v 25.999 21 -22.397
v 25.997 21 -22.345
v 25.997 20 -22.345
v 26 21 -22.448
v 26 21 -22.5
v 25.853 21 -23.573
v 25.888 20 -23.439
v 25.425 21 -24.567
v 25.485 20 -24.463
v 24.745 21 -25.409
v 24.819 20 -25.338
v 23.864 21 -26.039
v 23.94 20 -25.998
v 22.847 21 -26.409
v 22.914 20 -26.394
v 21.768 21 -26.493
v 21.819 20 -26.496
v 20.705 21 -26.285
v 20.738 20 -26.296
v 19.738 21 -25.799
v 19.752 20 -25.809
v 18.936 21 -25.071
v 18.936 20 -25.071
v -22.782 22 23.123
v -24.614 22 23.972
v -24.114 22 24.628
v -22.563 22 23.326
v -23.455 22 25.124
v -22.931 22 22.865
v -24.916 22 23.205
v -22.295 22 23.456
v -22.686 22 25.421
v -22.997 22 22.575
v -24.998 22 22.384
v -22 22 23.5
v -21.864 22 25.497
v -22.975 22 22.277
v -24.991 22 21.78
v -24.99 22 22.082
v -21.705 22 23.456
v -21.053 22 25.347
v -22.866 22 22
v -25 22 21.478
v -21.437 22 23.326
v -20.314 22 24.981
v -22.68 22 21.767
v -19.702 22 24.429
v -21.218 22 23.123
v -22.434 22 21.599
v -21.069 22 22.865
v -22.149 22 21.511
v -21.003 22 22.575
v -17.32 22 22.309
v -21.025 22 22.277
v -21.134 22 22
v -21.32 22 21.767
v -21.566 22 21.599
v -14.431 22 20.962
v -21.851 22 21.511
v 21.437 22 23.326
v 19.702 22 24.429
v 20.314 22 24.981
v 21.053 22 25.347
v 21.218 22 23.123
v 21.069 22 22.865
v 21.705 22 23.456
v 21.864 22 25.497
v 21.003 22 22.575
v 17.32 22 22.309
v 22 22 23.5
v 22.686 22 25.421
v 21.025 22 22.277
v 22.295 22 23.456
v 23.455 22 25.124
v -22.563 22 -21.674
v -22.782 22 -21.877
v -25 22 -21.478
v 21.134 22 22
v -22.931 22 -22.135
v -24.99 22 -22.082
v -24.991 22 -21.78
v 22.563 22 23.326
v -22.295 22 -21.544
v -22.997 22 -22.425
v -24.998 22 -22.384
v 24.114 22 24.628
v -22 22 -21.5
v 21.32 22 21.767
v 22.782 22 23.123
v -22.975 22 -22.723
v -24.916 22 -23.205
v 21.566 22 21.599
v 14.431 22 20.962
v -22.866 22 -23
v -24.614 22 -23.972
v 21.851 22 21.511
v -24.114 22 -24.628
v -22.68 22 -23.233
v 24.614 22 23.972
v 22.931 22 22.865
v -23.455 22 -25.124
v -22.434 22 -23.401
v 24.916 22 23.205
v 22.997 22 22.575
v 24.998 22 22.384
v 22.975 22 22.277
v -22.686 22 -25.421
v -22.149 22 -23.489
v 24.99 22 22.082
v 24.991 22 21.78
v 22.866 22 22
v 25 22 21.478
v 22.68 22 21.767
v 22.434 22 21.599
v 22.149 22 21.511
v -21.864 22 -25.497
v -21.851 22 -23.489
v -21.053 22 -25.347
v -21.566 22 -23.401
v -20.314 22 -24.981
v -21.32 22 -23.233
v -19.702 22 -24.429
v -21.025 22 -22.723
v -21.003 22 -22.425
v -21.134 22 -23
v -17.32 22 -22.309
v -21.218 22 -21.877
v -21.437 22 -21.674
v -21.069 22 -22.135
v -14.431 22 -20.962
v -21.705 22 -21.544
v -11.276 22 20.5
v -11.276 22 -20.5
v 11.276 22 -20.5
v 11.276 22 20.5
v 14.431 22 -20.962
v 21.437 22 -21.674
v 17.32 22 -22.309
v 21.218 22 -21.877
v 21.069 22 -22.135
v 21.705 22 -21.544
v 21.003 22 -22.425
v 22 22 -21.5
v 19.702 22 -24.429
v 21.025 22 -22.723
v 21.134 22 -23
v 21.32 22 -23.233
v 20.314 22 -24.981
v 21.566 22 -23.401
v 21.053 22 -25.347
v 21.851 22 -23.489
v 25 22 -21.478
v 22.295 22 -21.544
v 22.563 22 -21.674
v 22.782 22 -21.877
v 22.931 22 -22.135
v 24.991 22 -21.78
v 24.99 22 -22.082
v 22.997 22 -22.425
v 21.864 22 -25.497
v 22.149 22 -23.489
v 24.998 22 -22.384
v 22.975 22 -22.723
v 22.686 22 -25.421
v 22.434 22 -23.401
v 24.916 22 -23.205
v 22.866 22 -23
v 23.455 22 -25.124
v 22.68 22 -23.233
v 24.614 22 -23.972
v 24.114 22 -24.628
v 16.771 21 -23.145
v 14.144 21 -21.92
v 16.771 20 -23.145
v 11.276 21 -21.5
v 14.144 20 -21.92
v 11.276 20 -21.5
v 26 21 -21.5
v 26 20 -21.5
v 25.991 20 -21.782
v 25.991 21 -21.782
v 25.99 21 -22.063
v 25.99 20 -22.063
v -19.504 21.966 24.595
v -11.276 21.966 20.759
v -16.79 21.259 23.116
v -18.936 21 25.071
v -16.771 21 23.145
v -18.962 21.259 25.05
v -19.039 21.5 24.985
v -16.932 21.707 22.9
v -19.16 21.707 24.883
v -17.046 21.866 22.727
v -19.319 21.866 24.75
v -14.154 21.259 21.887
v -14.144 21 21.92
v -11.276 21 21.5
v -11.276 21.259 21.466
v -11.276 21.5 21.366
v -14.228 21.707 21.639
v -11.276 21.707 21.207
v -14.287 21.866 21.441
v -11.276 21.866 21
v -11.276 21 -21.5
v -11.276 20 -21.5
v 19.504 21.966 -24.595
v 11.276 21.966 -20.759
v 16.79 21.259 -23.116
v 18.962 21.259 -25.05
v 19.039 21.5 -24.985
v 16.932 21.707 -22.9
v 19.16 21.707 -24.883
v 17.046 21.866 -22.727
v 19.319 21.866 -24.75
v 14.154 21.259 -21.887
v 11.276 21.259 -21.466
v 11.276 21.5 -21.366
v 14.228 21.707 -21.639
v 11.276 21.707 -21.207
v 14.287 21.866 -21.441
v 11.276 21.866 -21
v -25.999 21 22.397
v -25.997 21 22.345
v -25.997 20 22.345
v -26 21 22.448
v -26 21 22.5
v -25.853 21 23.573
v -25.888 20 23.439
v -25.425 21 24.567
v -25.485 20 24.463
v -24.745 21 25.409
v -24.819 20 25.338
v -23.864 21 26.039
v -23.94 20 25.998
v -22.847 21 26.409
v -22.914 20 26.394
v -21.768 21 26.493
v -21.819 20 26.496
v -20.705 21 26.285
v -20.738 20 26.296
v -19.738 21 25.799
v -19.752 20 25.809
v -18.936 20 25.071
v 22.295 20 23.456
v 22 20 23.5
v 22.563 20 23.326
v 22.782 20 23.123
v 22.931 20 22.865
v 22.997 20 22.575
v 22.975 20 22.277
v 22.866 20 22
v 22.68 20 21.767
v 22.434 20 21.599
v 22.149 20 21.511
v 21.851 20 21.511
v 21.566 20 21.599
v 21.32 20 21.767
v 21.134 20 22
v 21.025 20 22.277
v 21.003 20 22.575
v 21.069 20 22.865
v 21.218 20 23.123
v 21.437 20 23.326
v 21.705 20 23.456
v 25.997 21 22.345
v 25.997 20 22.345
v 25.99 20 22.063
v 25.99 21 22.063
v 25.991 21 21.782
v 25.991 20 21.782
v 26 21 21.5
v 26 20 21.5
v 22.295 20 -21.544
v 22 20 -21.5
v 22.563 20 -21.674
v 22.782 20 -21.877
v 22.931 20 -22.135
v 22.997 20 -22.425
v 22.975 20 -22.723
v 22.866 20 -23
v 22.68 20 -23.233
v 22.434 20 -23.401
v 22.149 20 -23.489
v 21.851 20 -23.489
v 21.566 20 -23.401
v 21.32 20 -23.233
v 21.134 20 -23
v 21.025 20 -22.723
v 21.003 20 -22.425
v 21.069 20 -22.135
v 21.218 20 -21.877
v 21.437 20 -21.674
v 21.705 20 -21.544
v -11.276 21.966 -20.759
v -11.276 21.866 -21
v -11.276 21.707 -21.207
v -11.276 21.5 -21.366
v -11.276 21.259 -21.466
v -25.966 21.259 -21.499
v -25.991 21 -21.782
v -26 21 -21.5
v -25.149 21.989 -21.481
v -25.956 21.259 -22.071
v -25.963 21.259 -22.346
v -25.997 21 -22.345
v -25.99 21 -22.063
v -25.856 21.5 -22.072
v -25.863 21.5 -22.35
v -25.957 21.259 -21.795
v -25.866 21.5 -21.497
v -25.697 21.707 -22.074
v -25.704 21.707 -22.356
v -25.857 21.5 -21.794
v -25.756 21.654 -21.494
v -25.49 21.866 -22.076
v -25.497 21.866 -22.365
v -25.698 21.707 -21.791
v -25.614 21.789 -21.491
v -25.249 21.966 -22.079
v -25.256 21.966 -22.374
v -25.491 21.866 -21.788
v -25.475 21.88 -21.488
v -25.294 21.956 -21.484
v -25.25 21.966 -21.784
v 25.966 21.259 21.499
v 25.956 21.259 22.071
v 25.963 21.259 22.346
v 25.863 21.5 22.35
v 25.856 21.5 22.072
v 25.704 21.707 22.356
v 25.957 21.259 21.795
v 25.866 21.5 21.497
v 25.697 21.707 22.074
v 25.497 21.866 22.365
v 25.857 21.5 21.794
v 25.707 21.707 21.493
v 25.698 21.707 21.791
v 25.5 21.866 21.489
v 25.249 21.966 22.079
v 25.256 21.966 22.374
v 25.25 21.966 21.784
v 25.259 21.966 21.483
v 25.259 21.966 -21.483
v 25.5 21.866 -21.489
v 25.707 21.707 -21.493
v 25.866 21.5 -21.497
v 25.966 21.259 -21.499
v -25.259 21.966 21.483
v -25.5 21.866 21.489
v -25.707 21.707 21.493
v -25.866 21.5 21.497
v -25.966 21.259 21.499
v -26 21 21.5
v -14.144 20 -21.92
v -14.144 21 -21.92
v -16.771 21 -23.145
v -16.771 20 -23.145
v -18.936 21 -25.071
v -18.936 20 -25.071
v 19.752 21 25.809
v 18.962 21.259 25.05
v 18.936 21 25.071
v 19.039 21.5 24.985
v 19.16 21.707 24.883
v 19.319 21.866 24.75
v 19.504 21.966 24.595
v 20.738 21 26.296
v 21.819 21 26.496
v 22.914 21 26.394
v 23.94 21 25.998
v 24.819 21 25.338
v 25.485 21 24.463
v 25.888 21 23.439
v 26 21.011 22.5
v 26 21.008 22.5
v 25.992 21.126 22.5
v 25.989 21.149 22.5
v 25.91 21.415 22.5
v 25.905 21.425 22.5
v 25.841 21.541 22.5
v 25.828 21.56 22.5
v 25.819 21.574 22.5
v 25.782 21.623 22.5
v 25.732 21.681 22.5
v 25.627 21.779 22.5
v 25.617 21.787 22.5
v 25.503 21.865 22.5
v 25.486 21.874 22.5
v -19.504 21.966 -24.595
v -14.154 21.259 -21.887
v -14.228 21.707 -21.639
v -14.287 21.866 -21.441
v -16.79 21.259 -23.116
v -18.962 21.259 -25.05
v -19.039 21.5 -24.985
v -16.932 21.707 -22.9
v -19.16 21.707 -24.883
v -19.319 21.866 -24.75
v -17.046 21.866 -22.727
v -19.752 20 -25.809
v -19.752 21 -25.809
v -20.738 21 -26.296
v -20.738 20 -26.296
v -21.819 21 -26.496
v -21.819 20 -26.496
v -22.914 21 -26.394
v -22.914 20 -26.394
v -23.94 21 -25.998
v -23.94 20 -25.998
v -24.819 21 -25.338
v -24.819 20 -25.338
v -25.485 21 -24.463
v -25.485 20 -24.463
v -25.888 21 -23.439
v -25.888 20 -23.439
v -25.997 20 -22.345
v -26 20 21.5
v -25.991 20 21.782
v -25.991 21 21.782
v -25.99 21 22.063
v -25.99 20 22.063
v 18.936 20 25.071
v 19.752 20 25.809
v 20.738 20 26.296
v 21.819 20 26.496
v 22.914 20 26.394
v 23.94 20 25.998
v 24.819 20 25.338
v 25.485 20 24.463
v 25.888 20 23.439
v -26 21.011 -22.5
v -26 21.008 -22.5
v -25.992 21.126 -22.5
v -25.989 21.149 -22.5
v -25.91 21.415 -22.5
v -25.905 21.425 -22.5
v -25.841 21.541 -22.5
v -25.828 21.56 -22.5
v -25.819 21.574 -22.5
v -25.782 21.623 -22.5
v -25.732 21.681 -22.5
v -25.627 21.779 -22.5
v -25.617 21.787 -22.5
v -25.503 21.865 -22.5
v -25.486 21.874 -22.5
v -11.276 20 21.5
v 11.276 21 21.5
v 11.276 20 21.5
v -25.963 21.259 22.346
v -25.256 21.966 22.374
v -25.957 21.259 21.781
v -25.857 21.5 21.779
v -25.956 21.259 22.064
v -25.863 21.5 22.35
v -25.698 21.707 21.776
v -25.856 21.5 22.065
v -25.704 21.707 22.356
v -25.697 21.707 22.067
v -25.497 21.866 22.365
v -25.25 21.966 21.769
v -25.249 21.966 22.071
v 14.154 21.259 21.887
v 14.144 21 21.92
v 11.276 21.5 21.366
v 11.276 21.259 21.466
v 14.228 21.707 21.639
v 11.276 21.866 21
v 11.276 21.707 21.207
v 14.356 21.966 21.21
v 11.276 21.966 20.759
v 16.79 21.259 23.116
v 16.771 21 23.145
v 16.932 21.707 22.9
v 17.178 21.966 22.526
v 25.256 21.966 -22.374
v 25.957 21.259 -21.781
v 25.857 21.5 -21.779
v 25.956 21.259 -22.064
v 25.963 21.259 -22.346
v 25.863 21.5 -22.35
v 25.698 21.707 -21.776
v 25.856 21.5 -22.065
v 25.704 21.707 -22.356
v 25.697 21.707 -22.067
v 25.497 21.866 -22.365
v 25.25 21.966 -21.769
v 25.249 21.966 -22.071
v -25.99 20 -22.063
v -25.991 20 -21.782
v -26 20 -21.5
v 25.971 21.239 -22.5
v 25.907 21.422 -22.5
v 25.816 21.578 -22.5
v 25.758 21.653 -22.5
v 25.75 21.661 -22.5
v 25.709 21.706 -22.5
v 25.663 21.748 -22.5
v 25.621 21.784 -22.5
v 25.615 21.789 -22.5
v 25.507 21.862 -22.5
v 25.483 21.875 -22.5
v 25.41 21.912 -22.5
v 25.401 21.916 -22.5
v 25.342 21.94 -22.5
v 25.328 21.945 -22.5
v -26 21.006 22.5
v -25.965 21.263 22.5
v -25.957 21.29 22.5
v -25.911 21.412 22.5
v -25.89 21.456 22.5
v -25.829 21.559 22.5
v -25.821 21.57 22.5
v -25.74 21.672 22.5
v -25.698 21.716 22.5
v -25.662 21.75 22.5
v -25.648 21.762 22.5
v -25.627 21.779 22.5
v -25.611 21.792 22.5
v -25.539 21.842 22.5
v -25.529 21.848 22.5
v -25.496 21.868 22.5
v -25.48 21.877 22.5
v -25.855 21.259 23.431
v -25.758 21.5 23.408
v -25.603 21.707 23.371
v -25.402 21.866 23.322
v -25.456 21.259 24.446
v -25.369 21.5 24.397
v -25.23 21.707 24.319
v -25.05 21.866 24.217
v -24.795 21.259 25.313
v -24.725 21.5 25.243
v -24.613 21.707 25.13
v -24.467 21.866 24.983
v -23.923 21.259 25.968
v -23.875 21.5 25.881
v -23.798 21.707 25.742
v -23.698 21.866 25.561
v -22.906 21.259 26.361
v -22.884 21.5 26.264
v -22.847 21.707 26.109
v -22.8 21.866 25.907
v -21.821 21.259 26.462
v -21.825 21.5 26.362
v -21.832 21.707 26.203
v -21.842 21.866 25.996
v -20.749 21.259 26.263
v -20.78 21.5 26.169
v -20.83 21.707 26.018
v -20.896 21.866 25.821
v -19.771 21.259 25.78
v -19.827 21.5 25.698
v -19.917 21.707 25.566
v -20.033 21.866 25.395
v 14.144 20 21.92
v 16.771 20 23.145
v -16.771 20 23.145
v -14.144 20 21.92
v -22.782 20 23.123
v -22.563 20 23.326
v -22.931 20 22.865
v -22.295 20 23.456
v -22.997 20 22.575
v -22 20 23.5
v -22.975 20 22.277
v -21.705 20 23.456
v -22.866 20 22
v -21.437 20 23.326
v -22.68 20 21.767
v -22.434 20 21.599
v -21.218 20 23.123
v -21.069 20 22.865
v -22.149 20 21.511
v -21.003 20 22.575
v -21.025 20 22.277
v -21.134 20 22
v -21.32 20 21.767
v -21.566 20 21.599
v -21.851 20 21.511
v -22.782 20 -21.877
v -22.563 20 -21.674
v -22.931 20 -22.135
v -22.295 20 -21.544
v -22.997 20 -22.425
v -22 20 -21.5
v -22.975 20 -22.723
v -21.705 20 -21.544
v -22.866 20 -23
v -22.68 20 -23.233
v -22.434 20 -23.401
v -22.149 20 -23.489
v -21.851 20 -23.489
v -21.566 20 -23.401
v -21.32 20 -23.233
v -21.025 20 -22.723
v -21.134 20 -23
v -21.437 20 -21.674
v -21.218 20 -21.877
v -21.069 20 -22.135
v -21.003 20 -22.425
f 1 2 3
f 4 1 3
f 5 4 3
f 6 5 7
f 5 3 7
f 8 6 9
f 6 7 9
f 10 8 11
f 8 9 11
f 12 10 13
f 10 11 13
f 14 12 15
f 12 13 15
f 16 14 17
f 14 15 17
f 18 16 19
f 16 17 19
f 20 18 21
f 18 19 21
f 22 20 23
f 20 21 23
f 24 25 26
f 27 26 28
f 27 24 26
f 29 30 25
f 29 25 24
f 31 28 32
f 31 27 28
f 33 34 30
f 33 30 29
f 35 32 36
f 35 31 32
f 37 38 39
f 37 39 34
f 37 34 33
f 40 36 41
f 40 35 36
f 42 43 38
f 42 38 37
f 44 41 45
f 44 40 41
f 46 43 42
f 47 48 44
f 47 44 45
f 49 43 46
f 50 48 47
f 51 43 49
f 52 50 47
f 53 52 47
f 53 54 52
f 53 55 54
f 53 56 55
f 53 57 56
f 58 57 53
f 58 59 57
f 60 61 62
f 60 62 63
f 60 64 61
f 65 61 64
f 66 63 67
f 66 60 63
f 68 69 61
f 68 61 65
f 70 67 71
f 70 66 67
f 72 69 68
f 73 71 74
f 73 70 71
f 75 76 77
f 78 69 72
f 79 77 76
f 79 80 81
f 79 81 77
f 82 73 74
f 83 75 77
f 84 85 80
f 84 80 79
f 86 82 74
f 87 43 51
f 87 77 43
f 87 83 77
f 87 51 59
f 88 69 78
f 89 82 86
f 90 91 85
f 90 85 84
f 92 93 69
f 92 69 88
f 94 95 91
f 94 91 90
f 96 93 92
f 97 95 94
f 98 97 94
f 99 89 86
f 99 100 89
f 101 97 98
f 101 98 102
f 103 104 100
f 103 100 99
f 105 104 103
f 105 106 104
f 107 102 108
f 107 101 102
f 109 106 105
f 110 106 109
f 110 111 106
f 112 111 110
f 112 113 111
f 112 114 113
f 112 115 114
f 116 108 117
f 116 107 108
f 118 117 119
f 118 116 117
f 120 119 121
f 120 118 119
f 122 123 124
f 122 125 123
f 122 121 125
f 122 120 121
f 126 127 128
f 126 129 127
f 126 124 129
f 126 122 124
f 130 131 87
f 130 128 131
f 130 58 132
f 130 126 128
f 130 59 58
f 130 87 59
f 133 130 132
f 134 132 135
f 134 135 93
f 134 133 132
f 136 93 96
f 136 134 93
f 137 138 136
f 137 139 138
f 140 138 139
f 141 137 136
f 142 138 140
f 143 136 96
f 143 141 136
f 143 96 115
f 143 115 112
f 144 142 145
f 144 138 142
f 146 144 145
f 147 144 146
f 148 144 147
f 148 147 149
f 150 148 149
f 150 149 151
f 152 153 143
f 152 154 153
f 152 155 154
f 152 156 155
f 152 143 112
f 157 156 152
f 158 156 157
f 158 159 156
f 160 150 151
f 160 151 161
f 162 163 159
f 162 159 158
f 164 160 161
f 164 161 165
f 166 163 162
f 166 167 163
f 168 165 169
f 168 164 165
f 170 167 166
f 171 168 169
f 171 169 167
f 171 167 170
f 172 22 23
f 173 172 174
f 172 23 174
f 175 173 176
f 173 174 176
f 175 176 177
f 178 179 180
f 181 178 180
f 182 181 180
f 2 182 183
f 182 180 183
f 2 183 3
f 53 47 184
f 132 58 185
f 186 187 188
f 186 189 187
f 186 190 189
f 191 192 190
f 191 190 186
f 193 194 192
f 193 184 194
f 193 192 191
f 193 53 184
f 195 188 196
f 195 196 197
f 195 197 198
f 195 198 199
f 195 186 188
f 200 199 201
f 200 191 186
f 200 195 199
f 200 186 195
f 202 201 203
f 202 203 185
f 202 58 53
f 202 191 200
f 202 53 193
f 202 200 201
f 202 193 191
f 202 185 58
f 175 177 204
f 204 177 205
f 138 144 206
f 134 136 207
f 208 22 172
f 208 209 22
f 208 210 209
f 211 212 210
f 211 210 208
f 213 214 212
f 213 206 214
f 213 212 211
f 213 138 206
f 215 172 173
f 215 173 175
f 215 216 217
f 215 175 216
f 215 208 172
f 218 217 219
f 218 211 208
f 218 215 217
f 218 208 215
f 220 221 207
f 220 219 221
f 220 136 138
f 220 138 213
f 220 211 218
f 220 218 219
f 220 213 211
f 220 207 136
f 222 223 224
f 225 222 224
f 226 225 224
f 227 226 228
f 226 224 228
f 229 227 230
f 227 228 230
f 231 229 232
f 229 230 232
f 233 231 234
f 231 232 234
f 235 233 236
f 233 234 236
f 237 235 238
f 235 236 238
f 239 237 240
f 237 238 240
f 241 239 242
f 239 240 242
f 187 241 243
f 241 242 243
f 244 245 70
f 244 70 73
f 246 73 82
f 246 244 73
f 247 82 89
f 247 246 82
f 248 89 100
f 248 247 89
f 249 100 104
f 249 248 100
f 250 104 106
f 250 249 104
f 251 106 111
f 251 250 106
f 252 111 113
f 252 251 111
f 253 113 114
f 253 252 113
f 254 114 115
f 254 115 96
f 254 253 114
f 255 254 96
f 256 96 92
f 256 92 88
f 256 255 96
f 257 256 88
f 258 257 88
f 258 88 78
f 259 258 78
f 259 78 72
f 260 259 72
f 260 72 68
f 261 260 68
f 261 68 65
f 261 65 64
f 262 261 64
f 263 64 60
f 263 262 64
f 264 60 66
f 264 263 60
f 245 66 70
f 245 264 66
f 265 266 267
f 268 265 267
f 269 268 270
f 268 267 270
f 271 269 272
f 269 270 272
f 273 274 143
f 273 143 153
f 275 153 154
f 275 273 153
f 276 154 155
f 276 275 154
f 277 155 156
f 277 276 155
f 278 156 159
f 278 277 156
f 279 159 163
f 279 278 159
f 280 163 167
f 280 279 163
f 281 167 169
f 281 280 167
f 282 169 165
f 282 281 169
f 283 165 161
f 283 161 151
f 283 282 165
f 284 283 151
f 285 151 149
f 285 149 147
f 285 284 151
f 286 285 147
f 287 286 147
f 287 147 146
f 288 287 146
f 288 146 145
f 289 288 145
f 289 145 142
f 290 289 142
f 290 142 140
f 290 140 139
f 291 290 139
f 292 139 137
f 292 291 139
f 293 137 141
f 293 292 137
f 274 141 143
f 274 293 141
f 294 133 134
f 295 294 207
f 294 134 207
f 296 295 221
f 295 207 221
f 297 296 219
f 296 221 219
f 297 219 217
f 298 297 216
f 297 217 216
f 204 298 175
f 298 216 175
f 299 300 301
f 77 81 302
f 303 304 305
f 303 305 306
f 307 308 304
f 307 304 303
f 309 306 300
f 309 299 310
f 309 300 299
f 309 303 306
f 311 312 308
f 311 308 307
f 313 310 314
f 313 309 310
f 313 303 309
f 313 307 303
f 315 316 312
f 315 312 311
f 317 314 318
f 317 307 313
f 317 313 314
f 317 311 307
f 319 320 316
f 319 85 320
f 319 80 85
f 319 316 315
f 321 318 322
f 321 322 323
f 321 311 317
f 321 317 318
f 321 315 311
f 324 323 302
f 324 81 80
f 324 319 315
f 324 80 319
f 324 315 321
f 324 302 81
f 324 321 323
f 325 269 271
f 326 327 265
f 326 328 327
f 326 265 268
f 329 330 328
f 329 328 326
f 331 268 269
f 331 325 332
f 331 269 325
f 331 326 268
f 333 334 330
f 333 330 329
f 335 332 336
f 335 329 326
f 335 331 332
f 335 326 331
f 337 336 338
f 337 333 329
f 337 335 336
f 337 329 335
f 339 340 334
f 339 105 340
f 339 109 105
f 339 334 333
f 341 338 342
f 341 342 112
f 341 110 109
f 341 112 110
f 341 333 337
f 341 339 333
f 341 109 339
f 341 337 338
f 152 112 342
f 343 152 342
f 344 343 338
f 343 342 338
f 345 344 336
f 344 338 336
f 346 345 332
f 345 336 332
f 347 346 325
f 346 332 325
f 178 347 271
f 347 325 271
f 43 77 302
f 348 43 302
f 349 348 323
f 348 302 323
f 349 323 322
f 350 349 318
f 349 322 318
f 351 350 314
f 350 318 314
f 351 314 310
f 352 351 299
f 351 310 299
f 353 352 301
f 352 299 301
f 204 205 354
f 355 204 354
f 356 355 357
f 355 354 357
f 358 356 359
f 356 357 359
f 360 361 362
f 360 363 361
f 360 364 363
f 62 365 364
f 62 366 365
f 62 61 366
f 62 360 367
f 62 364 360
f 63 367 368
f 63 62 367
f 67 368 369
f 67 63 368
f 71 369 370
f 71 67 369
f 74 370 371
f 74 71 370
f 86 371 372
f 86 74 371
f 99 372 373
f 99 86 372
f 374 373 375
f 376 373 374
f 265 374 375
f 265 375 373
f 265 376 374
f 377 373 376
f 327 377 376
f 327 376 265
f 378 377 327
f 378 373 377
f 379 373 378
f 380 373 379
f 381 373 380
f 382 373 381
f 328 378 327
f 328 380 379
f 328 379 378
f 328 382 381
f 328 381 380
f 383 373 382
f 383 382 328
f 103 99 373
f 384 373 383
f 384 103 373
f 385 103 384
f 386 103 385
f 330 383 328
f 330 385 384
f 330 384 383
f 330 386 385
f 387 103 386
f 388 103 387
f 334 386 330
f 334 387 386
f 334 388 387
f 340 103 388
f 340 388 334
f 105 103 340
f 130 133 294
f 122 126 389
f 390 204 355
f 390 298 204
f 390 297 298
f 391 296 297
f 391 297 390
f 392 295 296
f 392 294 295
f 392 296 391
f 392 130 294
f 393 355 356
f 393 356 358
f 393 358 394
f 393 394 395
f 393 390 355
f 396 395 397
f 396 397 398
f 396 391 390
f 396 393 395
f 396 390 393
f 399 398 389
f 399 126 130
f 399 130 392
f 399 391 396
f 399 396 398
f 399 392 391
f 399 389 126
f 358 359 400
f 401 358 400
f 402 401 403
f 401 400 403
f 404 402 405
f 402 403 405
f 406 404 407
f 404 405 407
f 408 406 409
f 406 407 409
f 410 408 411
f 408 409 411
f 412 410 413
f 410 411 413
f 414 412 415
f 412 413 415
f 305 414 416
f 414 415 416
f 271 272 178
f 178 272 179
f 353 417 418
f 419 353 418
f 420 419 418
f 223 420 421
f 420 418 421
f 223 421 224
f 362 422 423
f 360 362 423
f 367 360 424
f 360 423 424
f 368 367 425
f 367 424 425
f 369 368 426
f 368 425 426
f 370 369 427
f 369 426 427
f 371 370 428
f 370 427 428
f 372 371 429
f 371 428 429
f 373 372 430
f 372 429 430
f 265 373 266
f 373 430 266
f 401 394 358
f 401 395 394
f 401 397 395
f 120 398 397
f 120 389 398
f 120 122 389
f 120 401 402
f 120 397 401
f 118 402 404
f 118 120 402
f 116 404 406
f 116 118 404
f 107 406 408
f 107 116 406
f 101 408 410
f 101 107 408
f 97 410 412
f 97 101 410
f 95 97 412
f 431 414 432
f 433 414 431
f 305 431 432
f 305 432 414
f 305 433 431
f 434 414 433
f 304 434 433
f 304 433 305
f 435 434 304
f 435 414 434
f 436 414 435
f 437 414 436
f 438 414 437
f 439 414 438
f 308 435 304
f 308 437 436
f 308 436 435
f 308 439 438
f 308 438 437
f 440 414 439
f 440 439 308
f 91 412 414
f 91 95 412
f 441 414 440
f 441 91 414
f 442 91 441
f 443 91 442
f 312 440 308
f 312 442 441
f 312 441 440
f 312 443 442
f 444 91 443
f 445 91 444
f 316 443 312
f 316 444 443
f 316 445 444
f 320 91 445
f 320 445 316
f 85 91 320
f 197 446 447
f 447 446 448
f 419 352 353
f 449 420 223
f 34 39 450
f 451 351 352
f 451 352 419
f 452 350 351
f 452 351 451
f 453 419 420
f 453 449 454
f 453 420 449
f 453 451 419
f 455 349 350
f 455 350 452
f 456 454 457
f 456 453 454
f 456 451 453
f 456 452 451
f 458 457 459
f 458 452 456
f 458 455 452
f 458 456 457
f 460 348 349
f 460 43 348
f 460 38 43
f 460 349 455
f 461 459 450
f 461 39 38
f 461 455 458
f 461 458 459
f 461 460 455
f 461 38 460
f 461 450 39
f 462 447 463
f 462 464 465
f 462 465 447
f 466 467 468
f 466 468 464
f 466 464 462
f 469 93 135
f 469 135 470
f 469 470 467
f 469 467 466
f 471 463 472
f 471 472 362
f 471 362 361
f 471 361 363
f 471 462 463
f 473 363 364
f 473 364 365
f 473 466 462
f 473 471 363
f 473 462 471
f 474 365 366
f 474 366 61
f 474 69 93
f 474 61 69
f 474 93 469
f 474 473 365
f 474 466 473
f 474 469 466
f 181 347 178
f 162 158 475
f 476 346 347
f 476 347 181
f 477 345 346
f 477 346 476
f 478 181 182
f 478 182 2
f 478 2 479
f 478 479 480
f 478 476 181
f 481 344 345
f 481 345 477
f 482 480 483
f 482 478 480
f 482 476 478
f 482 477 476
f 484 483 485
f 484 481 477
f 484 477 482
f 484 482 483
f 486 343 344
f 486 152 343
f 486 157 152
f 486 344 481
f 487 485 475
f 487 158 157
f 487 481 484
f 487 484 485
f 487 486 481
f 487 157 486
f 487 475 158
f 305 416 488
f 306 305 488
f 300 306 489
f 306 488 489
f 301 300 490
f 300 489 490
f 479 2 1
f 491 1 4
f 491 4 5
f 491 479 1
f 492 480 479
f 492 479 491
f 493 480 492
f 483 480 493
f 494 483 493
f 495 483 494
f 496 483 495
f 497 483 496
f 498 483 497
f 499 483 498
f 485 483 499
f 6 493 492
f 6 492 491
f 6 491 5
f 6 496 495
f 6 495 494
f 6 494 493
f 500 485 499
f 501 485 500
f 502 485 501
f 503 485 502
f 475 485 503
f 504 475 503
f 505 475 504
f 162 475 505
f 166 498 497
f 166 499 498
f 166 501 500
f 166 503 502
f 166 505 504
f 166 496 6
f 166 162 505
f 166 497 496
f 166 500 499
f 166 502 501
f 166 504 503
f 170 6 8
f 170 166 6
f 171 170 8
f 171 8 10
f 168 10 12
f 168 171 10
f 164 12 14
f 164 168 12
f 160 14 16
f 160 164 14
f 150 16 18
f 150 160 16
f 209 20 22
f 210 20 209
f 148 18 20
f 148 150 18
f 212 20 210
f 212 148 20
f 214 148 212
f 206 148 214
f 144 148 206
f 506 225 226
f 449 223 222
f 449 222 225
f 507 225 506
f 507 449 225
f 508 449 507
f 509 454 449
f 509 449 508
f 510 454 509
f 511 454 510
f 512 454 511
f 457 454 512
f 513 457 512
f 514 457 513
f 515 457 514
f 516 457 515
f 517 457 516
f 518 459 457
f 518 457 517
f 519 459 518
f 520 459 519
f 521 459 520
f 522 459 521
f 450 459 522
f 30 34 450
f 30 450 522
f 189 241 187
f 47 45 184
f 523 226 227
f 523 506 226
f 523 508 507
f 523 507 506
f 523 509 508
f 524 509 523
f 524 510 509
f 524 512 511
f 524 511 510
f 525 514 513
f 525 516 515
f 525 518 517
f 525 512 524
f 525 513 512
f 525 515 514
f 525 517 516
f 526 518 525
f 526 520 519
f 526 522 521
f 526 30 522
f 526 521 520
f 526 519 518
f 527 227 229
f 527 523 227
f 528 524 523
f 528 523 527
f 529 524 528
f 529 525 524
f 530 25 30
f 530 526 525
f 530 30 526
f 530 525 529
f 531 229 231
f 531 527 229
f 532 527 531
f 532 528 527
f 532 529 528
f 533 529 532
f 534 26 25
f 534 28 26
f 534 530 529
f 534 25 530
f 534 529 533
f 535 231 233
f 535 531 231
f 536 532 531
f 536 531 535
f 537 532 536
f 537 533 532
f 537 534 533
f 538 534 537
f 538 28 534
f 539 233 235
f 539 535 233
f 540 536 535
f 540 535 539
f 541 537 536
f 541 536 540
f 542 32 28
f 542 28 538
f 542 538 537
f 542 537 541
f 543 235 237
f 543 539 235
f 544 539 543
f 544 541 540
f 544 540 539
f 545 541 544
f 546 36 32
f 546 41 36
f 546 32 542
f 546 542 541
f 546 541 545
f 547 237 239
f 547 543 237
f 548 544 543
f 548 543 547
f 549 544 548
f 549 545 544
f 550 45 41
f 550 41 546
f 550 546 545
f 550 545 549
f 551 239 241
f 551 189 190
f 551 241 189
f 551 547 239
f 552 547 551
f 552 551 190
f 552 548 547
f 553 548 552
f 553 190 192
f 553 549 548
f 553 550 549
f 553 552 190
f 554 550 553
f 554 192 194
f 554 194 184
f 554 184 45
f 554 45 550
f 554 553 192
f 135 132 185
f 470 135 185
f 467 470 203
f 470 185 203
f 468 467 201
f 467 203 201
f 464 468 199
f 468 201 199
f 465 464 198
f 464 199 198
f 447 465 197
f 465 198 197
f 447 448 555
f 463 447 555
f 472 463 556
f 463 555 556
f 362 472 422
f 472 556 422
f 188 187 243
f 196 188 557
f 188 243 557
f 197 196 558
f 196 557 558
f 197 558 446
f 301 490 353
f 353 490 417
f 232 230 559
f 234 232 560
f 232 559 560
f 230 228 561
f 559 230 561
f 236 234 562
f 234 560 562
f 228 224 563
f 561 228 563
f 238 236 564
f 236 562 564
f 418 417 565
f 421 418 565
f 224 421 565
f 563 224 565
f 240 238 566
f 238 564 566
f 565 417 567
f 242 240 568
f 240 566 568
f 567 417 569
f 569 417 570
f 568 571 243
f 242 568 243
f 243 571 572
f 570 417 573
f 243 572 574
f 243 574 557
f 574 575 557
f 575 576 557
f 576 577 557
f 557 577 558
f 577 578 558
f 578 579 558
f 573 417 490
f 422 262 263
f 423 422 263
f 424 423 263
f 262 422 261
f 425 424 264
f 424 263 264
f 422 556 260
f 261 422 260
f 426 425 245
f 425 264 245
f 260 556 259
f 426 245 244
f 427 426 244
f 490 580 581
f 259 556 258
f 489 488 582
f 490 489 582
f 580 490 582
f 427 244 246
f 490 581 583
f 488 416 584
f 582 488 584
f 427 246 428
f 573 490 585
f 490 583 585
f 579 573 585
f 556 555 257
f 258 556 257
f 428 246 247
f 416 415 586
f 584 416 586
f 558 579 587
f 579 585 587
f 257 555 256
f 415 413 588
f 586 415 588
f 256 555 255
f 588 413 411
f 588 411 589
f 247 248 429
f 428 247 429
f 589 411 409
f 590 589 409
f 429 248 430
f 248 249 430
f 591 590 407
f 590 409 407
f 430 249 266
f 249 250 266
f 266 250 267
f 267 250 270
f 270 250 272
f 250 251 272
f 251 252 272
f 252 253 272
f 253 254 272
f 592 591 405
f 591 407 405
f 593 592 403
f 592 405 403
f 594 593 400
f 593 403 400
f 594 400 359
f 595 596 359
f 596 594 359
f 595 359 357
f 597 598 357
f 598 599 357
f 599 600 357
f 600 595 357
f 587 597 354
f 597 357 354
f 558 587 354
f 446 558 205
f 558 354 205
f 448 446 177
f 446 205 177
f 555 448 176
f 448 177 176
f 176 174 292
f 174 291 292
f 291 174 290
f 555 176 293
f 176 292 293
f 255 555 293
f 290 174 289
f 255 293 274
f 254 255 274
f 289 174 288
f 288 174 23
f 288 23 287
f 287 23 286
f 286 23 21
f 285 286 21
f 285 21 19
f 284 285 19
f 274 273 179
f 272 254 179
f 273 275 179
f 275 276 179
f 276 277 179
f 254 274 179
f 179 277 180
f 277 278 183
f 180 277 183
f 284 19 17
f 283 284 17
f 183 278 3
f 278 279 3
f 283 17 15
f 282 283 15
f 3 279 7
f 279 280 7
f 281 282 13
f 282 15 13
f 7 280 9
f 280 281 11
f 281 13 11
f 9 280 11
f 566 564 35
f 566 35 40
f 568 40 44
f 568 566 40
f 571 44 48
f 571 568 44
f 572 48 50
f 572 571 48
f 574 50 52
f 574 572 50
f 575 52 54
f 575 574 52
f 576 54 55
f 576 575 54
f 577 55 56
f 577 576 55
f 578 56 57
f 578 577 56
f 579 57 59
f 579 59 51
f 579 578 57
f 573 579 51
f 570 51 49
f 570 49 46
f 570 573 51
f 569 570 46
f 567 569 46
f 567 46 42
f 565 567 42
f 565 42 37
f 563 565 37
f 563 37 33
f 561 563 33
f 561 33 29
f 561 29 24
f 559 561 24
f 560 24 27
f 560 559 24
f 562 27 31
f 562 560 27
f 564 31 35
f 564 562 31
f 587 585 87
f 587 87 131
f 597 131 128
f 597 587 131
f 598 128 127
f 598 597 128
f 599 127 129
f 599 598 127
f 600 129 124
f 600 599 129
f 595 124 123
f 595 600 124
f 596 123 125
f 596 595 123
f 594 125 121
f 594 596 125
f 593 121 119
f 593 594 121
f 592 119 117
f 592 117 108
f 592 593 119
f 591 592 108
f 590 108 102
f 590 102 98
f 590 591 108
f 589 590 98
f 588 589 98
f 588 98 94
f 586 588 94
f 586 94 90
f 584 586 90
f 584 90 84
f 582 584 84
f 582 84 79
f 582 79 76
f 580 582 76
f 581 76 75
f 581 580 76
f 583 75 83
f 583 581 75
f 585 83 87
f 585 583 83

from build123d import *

# Parameters (mm, degrees)
SKETCH1_R           = 1
BOSS_EXTRUDE1_DEPTH = 2
FILLET1_R           = 1


with BuildPart() as part:
    # Sketch1 → Boss-Extrude1 (new body)
    with BuildSketch(Plane(origin=(0, 20, 0), x_dir=(1, 0, 0), z_dir=(0, 1, 0))):
        with BuildLine():
            Line((11.276194705, 21.5), (-11.276194705, 21.5))
            ThreePointArc((-11.276194705, 21.5), (-15.501965979, 22.436730328), (-18.93605563, 25.071428571))
            ThreePointArc((-18.93605563, 25.071428571), (-23.440763365, 26.231514562), (-25.99700152, 22.345148936))
            ThreePointArc((-25.99700152, 22.345148936), (-25.989568255, 21.922542776), (-26, 21.5))
            Line((-26, 21.5), (-26, -21.5))
            ThreePointArc((-26, -21.5), (-25.989568255, -21.922542776), (-25.99700152, -22.345148936))
            ThreePointArc((-25.99700152, -22.345148936), (-23.440763365, -26.231514562), (-18.93605563, -25.071428571))
            ThreePointArc((-18.93605563, -25.071428571), (-15.501965979, -22.436730328), (-11.276194705, -21.5))
            Line((-11.276194705, -21.5), (11.276194705, -21.5))
            ThreePointArc((11.276194705, -21.5), (15.501965979, -22.436730328), (18.93605563, -25.071428571))
            ThreePointArc((18.93605563, -25.071428571), (23.440763365, -26.231514562), (25.99700152, -22.345148936))
            ThreePointArc((25.99700152, -22.345148936), (25.989568255, -21.922542776), (26, -21.5))
            Line((26, -21.5), (26, 21.5))
            ThreePointArc((26, 21.5), (25.989568255, 21.922542776), (25.99700152, 22.345148936))
            ThreePointArc((25.99700152, 22.345148936), (23.440763365, 26.231514562), (18.93605563, 25.071428571))
            ThreePointArc((18.93605563, 25.071428571), (15.501965979, 22.436730328), (11.276194705, 21.5))
        make_face()
        with Locations(Location((-22, -22.5, 0), (0, 0, 270))):
            Circle(SKETCH1_R, mode=Mode.SUBTRACT)
        with Locations(Location((22, -22.5, 0), (0, 0, 270))):
            Circle(SKETCH1_R, mode=Mode.SUBTRACT)
        with Locations(Location((22, 22.5, 0), (0, 0, 270))):
            Circle(SKETCH1_R, mode=Mode.SUBTRACT)
        with Locations(Location((-22, 22.5, 0), (0, 0, 270))):
            Circle(SKETCH1_R, mode=Mode.SUBTRACT)
    extrude(amount=BOSS_EXTRUDE1_DEPTH)

    # Fillet1
    # the kernel refuses this fillet: 1 mm, written as the material it takes off along each edge
    with BuildSketch(Plane(origin=(-11.276194705, 22, -31.5), x_dir=(0, 0, 1), z_dir=(1, 0, 0))) as fillet1_piece_1:
        with BuildLine():
            CenterArc((10 + FILLET1_R, FILLET1_R), FILLET1_R, 180, 90)
            Line((10 + FILLET1_R, 0), (10, 0))
            Line((10, 0), (10, FILLET1_R))
        make_face()
    revolve(axis=Axis((-11.276194705, 22, -31.5), (0, -1, 0)), revolution_arc=49.994799115, mode=Mode.SUBTRACT)
    with BuildSketch(Plane(origin=(-22, 22, -22.5), x_dir=(0.7659860924831153, 0, -0.6428571428571425), z_dir=(0.6428571428571425, 0, 0.7659860924831153))) as fillet1_piece_2:
        with BuildLine():
            CenterArc((4 - FILLET1_R, -FILLET1_R), FILLET1_R, 0, 90)
            Line((4 - FILLET1_R, 0), (4, 0))
            Line((4, 0), (4, -FILLET1_R))
        make_face()
    revolve(axis=Axis((-22, 22, -22.5), (0, 1, 0)), revolution_arc=142.21343163, mode=Mode.SUBTRACT)
    with BuildSketch(Plane(origin=(-35.989505319, 22, -21.958021275), x_dir=(0.999250379905618, 0, -0.03871276609179466), z_dir=(-0.03871276609179466, 0, -0.999250379905618))) as fillet1_piece_3:
        with BuildLine():
            CenterArc((10 + FILLET1_R, FILLET1_R), FILLET1_R, 180, 90)
            Line((10 + FILLET1_R, 0), (10, 0))
            Line((10, 0), (10, FILLET1_R))
        make_face()
    revolve(axis=Axis((-35.989505319, 22, -21.958021275), (0, -1, 0)), revolution_arc=19.167781067, mode=Mode.SUBTRACT)
    with BuildSketch(Plane(origin=(-26, 22, -24), x_dir=(0, -1, 0), z_dir=(0, 0, 1)), Plane(origin=(26, 22, 24), x_dir=(0, -1, 0), z_dir=(0, 0, -1))) as fillet1_piece_4:
        with BuildLine():
            CenterArc((FILLET1_R, FILLET1_R), FILLET1_R, 180, 90)
            Line((0, FILLET1_R), (0, 0))
            Line((0, 0), (FILLET1_R, 0))
        make_face()
    extrude(amount=48, mode=Mode.SUBTRACT)
    with BuildSketch(Plane(origin=(-35.989505319, 22, 21.958021275), x_dir=(0.9565638665427638, 0, -0.2915228451163944), z_dir=(-0.2915228451163944, 0, -0.9565638665427638))) as fillet1_piece_5:
        with BuildLine():
            CenterArc((10 + FILLET1_R, FILLET1_R), FILLET1_R, 180, 90)
            Line((10 + FILLET1_R, 0), (10, 0))
            Line((10, 0), (10, FILLET1_R))
        make_face()
    revolve(axis=Axis((-35.989505319, 22, 21.958021275), (0, -1, 0)), revolution_arc=19.167781067, mode=Mode.SUBTRACT)
    with BuildSketch(Plane(origin=(-22, 22, 22.5), x_dir=(-0.9992503799056173, 0, -0.03871276609181696), z_dir=(0.03871276609181696, 0, -0.9992503799056173))) as fillet1_piece_6:
        with BuildLine():
            CenterArc((4 - FILLET1_R, -FILLET1_R), FILLET1_R, 0, 90)
            Line((4 - FILLET1_R, 0), (4, 0))
            Line((4, 0), (4, -FILLET1_R))
        make_face()
    revolve(axis=Axis((-22, 22, 22.5), (0, 1, 0)), revolution_arc=142.21343163, mode=Mode.SUBTRACT)
    with BuildSketch(Plane(origin=(-11.276194705, 22, 31.5), x_dir=(-0.7659860924831162, 0, -0.6428571428571414), z_dir=(-0.6428571428571414, 0, 0.7659860924831162))) as fillet1_piece_7:
        with BuildLine():
            CenterArc((10 + FILLET1_R, FILLET1_R), FILLET1_R, 180, 90)
            Line((10 + FILLET1_R, 0), (10, 0))
            Line((10, 0), (10, FILLET1_R))
        make_face()
    revolve(axis=Axis((-11.276194705, 22, 31.5), (0, -1, 0)), revolution_arc=49.994799115, mode=Mode.SUBTRACT)
    with BuildSketch(Plane(origin=(-11.276194705, 22, 21.5), x_dir=(0, -1, 0), z_dir=(1, 0, 0)), Plane(origin=(11.276194705, 22, -21.5), x_dir=(0, -1, 0), z_dir=(-1, 0, 0))) as fillet1_piece_8:
        with BuildLine():
            CenterArc((FILLET1_R, FILLET1_R), FILLET1_R, 180, 90)
            Line((0, FILLET1_R), (0, 0))
            Line((0, 0), (FILLET1_R, 0))
        make_face()
    extrude(amount=22.55238941, mode=Mode.SUBTRACT)
    with BuildSketch(Plane(origin=(11.276194705, 22, 31.5), x_dir=(0, 0, -1), z_dir=(-1, 0, 0))) as fillet1_piece_9:
        with BuildLine():
            CenterArc((10 + FILLET1_R, FILLET1_R), FILLET1_R, 180, 90)
            Line((10 + FILLET1_R, 0), (10, 0))
            Line((10, 0), (10, FILLET1_R))
        make_face()
    revolve(axis=Axis((11.276194705, 22, 31.5), (0, -1, 0)), revolution_arc=49.994799115, mode=Mode.SUBTRACT)
    with BuildSketch(Plane(origin=(22, 22, 22.5), x_dir=(-0.7659860924831153, 0, 0.6428571428571425), z_dir=(-0.6428571428571425, 0, -0.7659860924831153))) as fillet1_piece_10:
        with BuildLine():
            CenterArc((4 - FILLET1_R, -FILLET1_R), FILLET1_R, 0, 90)
            Line((4 - FILLET1_R, 0), (4, 0))
            Line((4, 0), (4, -FILLET1_R))
        make_face()
    revolve(axis=Axis((22, 22, 22.5), (0, 1, 0)), revolution_arc=142.21343163, mode=Mode.SUBTRACT)
    with BuildSketch(Plane(origin=(11.276194705, 22, -31.5), x_dir=(0.7659860924831151, 0, 0.6428571428571426), z_dir=(0.6428571428571426, 0, -0.7659860924831151))) as fillet1_piece_11:
        with BuildLine():
            CenterArc((10 + FILLET1_R, FILLET1_R), FILLET1_R, 180, 90)
            Line((10 + FILLET1_R, 0), (10, 0))
            Line((10, 0), (10, FILLET1_R))
        make_face()
    revolve(axis=Axis((11.276194705, 22, -31.5), (0, -1, 0)), revolution_arc=49.994799115, mode=Mode.SUBTRACT)
    with BuildSketch(Plane(origin=(35.989505319, 22, 21.958021275), x_dir=(-0.999250379905617, 0, 0.03871276609181962), z_dir=(0.03871276609181962, 0, 0.999250379905617))) as fillet1_piece_12:
        with BuildLine():
            CenterArc((10 + FILLET1_R, FILLET1_R), FILLET1_R, 180, 90)
            Line((10 + FILLET1_R, 0), (10, 0))
            Line((10, 0), (10, FILLET1_R))
        make_face()
    revolve(axis=Axis((35.989505319, 22, 21.958021275), (0, -1, 0)), revolution_arc=19.167781067, mode=Mode.SUBTRACT)
    with BuildSketch(Plane(origin=(35.989505319, 22, -21.958021275), x_dir=(-0.9565638665427474, 0, 0.2915228451164487), z_dir=(0.2915228451164487, 0, 0.9565638665427474))) as fillet1_piece_13:
        with BuildLine():
            CenterArc((10 + FILLET1_R, FILLET1_R), FILLET1_R, 180, 90)
            Line((10 + FILLET1_R, 0), (10, 0))
            Line((10, 0), (10, FILLET1_R))
        make_face()
    revolve(axis=Axis((35.989505319, 22, -21.958021275), (0, -1, 0)), revolution_arc=19.167781067, mode=Mode.SUBTRACT)
    with BuildSketch(Plane(origin=(22, 22, -22.5), x_dir=(0.9992503799056174, 0, 0.038712766091811596), z_dir=(-0.038712766091811596, 0, 0.9992503799056174))) as fillet1_piece_14:
        with BuildLine():
            CenterArc((4 - FILLET1_R, -FILLET1_R), FILLET1_R, 0, 90)
            Line((4 - FILLET1_R, 0), (4, 0))
            Line((4, 0), (4, -FILLET1_R))
        make_face()
    revolve(axis=Axis((22, 22, -22.5), (0, 1, 0)), revolution_arc=142.21343163, mode=Mode.SUBTRACT)


solid = part.part
